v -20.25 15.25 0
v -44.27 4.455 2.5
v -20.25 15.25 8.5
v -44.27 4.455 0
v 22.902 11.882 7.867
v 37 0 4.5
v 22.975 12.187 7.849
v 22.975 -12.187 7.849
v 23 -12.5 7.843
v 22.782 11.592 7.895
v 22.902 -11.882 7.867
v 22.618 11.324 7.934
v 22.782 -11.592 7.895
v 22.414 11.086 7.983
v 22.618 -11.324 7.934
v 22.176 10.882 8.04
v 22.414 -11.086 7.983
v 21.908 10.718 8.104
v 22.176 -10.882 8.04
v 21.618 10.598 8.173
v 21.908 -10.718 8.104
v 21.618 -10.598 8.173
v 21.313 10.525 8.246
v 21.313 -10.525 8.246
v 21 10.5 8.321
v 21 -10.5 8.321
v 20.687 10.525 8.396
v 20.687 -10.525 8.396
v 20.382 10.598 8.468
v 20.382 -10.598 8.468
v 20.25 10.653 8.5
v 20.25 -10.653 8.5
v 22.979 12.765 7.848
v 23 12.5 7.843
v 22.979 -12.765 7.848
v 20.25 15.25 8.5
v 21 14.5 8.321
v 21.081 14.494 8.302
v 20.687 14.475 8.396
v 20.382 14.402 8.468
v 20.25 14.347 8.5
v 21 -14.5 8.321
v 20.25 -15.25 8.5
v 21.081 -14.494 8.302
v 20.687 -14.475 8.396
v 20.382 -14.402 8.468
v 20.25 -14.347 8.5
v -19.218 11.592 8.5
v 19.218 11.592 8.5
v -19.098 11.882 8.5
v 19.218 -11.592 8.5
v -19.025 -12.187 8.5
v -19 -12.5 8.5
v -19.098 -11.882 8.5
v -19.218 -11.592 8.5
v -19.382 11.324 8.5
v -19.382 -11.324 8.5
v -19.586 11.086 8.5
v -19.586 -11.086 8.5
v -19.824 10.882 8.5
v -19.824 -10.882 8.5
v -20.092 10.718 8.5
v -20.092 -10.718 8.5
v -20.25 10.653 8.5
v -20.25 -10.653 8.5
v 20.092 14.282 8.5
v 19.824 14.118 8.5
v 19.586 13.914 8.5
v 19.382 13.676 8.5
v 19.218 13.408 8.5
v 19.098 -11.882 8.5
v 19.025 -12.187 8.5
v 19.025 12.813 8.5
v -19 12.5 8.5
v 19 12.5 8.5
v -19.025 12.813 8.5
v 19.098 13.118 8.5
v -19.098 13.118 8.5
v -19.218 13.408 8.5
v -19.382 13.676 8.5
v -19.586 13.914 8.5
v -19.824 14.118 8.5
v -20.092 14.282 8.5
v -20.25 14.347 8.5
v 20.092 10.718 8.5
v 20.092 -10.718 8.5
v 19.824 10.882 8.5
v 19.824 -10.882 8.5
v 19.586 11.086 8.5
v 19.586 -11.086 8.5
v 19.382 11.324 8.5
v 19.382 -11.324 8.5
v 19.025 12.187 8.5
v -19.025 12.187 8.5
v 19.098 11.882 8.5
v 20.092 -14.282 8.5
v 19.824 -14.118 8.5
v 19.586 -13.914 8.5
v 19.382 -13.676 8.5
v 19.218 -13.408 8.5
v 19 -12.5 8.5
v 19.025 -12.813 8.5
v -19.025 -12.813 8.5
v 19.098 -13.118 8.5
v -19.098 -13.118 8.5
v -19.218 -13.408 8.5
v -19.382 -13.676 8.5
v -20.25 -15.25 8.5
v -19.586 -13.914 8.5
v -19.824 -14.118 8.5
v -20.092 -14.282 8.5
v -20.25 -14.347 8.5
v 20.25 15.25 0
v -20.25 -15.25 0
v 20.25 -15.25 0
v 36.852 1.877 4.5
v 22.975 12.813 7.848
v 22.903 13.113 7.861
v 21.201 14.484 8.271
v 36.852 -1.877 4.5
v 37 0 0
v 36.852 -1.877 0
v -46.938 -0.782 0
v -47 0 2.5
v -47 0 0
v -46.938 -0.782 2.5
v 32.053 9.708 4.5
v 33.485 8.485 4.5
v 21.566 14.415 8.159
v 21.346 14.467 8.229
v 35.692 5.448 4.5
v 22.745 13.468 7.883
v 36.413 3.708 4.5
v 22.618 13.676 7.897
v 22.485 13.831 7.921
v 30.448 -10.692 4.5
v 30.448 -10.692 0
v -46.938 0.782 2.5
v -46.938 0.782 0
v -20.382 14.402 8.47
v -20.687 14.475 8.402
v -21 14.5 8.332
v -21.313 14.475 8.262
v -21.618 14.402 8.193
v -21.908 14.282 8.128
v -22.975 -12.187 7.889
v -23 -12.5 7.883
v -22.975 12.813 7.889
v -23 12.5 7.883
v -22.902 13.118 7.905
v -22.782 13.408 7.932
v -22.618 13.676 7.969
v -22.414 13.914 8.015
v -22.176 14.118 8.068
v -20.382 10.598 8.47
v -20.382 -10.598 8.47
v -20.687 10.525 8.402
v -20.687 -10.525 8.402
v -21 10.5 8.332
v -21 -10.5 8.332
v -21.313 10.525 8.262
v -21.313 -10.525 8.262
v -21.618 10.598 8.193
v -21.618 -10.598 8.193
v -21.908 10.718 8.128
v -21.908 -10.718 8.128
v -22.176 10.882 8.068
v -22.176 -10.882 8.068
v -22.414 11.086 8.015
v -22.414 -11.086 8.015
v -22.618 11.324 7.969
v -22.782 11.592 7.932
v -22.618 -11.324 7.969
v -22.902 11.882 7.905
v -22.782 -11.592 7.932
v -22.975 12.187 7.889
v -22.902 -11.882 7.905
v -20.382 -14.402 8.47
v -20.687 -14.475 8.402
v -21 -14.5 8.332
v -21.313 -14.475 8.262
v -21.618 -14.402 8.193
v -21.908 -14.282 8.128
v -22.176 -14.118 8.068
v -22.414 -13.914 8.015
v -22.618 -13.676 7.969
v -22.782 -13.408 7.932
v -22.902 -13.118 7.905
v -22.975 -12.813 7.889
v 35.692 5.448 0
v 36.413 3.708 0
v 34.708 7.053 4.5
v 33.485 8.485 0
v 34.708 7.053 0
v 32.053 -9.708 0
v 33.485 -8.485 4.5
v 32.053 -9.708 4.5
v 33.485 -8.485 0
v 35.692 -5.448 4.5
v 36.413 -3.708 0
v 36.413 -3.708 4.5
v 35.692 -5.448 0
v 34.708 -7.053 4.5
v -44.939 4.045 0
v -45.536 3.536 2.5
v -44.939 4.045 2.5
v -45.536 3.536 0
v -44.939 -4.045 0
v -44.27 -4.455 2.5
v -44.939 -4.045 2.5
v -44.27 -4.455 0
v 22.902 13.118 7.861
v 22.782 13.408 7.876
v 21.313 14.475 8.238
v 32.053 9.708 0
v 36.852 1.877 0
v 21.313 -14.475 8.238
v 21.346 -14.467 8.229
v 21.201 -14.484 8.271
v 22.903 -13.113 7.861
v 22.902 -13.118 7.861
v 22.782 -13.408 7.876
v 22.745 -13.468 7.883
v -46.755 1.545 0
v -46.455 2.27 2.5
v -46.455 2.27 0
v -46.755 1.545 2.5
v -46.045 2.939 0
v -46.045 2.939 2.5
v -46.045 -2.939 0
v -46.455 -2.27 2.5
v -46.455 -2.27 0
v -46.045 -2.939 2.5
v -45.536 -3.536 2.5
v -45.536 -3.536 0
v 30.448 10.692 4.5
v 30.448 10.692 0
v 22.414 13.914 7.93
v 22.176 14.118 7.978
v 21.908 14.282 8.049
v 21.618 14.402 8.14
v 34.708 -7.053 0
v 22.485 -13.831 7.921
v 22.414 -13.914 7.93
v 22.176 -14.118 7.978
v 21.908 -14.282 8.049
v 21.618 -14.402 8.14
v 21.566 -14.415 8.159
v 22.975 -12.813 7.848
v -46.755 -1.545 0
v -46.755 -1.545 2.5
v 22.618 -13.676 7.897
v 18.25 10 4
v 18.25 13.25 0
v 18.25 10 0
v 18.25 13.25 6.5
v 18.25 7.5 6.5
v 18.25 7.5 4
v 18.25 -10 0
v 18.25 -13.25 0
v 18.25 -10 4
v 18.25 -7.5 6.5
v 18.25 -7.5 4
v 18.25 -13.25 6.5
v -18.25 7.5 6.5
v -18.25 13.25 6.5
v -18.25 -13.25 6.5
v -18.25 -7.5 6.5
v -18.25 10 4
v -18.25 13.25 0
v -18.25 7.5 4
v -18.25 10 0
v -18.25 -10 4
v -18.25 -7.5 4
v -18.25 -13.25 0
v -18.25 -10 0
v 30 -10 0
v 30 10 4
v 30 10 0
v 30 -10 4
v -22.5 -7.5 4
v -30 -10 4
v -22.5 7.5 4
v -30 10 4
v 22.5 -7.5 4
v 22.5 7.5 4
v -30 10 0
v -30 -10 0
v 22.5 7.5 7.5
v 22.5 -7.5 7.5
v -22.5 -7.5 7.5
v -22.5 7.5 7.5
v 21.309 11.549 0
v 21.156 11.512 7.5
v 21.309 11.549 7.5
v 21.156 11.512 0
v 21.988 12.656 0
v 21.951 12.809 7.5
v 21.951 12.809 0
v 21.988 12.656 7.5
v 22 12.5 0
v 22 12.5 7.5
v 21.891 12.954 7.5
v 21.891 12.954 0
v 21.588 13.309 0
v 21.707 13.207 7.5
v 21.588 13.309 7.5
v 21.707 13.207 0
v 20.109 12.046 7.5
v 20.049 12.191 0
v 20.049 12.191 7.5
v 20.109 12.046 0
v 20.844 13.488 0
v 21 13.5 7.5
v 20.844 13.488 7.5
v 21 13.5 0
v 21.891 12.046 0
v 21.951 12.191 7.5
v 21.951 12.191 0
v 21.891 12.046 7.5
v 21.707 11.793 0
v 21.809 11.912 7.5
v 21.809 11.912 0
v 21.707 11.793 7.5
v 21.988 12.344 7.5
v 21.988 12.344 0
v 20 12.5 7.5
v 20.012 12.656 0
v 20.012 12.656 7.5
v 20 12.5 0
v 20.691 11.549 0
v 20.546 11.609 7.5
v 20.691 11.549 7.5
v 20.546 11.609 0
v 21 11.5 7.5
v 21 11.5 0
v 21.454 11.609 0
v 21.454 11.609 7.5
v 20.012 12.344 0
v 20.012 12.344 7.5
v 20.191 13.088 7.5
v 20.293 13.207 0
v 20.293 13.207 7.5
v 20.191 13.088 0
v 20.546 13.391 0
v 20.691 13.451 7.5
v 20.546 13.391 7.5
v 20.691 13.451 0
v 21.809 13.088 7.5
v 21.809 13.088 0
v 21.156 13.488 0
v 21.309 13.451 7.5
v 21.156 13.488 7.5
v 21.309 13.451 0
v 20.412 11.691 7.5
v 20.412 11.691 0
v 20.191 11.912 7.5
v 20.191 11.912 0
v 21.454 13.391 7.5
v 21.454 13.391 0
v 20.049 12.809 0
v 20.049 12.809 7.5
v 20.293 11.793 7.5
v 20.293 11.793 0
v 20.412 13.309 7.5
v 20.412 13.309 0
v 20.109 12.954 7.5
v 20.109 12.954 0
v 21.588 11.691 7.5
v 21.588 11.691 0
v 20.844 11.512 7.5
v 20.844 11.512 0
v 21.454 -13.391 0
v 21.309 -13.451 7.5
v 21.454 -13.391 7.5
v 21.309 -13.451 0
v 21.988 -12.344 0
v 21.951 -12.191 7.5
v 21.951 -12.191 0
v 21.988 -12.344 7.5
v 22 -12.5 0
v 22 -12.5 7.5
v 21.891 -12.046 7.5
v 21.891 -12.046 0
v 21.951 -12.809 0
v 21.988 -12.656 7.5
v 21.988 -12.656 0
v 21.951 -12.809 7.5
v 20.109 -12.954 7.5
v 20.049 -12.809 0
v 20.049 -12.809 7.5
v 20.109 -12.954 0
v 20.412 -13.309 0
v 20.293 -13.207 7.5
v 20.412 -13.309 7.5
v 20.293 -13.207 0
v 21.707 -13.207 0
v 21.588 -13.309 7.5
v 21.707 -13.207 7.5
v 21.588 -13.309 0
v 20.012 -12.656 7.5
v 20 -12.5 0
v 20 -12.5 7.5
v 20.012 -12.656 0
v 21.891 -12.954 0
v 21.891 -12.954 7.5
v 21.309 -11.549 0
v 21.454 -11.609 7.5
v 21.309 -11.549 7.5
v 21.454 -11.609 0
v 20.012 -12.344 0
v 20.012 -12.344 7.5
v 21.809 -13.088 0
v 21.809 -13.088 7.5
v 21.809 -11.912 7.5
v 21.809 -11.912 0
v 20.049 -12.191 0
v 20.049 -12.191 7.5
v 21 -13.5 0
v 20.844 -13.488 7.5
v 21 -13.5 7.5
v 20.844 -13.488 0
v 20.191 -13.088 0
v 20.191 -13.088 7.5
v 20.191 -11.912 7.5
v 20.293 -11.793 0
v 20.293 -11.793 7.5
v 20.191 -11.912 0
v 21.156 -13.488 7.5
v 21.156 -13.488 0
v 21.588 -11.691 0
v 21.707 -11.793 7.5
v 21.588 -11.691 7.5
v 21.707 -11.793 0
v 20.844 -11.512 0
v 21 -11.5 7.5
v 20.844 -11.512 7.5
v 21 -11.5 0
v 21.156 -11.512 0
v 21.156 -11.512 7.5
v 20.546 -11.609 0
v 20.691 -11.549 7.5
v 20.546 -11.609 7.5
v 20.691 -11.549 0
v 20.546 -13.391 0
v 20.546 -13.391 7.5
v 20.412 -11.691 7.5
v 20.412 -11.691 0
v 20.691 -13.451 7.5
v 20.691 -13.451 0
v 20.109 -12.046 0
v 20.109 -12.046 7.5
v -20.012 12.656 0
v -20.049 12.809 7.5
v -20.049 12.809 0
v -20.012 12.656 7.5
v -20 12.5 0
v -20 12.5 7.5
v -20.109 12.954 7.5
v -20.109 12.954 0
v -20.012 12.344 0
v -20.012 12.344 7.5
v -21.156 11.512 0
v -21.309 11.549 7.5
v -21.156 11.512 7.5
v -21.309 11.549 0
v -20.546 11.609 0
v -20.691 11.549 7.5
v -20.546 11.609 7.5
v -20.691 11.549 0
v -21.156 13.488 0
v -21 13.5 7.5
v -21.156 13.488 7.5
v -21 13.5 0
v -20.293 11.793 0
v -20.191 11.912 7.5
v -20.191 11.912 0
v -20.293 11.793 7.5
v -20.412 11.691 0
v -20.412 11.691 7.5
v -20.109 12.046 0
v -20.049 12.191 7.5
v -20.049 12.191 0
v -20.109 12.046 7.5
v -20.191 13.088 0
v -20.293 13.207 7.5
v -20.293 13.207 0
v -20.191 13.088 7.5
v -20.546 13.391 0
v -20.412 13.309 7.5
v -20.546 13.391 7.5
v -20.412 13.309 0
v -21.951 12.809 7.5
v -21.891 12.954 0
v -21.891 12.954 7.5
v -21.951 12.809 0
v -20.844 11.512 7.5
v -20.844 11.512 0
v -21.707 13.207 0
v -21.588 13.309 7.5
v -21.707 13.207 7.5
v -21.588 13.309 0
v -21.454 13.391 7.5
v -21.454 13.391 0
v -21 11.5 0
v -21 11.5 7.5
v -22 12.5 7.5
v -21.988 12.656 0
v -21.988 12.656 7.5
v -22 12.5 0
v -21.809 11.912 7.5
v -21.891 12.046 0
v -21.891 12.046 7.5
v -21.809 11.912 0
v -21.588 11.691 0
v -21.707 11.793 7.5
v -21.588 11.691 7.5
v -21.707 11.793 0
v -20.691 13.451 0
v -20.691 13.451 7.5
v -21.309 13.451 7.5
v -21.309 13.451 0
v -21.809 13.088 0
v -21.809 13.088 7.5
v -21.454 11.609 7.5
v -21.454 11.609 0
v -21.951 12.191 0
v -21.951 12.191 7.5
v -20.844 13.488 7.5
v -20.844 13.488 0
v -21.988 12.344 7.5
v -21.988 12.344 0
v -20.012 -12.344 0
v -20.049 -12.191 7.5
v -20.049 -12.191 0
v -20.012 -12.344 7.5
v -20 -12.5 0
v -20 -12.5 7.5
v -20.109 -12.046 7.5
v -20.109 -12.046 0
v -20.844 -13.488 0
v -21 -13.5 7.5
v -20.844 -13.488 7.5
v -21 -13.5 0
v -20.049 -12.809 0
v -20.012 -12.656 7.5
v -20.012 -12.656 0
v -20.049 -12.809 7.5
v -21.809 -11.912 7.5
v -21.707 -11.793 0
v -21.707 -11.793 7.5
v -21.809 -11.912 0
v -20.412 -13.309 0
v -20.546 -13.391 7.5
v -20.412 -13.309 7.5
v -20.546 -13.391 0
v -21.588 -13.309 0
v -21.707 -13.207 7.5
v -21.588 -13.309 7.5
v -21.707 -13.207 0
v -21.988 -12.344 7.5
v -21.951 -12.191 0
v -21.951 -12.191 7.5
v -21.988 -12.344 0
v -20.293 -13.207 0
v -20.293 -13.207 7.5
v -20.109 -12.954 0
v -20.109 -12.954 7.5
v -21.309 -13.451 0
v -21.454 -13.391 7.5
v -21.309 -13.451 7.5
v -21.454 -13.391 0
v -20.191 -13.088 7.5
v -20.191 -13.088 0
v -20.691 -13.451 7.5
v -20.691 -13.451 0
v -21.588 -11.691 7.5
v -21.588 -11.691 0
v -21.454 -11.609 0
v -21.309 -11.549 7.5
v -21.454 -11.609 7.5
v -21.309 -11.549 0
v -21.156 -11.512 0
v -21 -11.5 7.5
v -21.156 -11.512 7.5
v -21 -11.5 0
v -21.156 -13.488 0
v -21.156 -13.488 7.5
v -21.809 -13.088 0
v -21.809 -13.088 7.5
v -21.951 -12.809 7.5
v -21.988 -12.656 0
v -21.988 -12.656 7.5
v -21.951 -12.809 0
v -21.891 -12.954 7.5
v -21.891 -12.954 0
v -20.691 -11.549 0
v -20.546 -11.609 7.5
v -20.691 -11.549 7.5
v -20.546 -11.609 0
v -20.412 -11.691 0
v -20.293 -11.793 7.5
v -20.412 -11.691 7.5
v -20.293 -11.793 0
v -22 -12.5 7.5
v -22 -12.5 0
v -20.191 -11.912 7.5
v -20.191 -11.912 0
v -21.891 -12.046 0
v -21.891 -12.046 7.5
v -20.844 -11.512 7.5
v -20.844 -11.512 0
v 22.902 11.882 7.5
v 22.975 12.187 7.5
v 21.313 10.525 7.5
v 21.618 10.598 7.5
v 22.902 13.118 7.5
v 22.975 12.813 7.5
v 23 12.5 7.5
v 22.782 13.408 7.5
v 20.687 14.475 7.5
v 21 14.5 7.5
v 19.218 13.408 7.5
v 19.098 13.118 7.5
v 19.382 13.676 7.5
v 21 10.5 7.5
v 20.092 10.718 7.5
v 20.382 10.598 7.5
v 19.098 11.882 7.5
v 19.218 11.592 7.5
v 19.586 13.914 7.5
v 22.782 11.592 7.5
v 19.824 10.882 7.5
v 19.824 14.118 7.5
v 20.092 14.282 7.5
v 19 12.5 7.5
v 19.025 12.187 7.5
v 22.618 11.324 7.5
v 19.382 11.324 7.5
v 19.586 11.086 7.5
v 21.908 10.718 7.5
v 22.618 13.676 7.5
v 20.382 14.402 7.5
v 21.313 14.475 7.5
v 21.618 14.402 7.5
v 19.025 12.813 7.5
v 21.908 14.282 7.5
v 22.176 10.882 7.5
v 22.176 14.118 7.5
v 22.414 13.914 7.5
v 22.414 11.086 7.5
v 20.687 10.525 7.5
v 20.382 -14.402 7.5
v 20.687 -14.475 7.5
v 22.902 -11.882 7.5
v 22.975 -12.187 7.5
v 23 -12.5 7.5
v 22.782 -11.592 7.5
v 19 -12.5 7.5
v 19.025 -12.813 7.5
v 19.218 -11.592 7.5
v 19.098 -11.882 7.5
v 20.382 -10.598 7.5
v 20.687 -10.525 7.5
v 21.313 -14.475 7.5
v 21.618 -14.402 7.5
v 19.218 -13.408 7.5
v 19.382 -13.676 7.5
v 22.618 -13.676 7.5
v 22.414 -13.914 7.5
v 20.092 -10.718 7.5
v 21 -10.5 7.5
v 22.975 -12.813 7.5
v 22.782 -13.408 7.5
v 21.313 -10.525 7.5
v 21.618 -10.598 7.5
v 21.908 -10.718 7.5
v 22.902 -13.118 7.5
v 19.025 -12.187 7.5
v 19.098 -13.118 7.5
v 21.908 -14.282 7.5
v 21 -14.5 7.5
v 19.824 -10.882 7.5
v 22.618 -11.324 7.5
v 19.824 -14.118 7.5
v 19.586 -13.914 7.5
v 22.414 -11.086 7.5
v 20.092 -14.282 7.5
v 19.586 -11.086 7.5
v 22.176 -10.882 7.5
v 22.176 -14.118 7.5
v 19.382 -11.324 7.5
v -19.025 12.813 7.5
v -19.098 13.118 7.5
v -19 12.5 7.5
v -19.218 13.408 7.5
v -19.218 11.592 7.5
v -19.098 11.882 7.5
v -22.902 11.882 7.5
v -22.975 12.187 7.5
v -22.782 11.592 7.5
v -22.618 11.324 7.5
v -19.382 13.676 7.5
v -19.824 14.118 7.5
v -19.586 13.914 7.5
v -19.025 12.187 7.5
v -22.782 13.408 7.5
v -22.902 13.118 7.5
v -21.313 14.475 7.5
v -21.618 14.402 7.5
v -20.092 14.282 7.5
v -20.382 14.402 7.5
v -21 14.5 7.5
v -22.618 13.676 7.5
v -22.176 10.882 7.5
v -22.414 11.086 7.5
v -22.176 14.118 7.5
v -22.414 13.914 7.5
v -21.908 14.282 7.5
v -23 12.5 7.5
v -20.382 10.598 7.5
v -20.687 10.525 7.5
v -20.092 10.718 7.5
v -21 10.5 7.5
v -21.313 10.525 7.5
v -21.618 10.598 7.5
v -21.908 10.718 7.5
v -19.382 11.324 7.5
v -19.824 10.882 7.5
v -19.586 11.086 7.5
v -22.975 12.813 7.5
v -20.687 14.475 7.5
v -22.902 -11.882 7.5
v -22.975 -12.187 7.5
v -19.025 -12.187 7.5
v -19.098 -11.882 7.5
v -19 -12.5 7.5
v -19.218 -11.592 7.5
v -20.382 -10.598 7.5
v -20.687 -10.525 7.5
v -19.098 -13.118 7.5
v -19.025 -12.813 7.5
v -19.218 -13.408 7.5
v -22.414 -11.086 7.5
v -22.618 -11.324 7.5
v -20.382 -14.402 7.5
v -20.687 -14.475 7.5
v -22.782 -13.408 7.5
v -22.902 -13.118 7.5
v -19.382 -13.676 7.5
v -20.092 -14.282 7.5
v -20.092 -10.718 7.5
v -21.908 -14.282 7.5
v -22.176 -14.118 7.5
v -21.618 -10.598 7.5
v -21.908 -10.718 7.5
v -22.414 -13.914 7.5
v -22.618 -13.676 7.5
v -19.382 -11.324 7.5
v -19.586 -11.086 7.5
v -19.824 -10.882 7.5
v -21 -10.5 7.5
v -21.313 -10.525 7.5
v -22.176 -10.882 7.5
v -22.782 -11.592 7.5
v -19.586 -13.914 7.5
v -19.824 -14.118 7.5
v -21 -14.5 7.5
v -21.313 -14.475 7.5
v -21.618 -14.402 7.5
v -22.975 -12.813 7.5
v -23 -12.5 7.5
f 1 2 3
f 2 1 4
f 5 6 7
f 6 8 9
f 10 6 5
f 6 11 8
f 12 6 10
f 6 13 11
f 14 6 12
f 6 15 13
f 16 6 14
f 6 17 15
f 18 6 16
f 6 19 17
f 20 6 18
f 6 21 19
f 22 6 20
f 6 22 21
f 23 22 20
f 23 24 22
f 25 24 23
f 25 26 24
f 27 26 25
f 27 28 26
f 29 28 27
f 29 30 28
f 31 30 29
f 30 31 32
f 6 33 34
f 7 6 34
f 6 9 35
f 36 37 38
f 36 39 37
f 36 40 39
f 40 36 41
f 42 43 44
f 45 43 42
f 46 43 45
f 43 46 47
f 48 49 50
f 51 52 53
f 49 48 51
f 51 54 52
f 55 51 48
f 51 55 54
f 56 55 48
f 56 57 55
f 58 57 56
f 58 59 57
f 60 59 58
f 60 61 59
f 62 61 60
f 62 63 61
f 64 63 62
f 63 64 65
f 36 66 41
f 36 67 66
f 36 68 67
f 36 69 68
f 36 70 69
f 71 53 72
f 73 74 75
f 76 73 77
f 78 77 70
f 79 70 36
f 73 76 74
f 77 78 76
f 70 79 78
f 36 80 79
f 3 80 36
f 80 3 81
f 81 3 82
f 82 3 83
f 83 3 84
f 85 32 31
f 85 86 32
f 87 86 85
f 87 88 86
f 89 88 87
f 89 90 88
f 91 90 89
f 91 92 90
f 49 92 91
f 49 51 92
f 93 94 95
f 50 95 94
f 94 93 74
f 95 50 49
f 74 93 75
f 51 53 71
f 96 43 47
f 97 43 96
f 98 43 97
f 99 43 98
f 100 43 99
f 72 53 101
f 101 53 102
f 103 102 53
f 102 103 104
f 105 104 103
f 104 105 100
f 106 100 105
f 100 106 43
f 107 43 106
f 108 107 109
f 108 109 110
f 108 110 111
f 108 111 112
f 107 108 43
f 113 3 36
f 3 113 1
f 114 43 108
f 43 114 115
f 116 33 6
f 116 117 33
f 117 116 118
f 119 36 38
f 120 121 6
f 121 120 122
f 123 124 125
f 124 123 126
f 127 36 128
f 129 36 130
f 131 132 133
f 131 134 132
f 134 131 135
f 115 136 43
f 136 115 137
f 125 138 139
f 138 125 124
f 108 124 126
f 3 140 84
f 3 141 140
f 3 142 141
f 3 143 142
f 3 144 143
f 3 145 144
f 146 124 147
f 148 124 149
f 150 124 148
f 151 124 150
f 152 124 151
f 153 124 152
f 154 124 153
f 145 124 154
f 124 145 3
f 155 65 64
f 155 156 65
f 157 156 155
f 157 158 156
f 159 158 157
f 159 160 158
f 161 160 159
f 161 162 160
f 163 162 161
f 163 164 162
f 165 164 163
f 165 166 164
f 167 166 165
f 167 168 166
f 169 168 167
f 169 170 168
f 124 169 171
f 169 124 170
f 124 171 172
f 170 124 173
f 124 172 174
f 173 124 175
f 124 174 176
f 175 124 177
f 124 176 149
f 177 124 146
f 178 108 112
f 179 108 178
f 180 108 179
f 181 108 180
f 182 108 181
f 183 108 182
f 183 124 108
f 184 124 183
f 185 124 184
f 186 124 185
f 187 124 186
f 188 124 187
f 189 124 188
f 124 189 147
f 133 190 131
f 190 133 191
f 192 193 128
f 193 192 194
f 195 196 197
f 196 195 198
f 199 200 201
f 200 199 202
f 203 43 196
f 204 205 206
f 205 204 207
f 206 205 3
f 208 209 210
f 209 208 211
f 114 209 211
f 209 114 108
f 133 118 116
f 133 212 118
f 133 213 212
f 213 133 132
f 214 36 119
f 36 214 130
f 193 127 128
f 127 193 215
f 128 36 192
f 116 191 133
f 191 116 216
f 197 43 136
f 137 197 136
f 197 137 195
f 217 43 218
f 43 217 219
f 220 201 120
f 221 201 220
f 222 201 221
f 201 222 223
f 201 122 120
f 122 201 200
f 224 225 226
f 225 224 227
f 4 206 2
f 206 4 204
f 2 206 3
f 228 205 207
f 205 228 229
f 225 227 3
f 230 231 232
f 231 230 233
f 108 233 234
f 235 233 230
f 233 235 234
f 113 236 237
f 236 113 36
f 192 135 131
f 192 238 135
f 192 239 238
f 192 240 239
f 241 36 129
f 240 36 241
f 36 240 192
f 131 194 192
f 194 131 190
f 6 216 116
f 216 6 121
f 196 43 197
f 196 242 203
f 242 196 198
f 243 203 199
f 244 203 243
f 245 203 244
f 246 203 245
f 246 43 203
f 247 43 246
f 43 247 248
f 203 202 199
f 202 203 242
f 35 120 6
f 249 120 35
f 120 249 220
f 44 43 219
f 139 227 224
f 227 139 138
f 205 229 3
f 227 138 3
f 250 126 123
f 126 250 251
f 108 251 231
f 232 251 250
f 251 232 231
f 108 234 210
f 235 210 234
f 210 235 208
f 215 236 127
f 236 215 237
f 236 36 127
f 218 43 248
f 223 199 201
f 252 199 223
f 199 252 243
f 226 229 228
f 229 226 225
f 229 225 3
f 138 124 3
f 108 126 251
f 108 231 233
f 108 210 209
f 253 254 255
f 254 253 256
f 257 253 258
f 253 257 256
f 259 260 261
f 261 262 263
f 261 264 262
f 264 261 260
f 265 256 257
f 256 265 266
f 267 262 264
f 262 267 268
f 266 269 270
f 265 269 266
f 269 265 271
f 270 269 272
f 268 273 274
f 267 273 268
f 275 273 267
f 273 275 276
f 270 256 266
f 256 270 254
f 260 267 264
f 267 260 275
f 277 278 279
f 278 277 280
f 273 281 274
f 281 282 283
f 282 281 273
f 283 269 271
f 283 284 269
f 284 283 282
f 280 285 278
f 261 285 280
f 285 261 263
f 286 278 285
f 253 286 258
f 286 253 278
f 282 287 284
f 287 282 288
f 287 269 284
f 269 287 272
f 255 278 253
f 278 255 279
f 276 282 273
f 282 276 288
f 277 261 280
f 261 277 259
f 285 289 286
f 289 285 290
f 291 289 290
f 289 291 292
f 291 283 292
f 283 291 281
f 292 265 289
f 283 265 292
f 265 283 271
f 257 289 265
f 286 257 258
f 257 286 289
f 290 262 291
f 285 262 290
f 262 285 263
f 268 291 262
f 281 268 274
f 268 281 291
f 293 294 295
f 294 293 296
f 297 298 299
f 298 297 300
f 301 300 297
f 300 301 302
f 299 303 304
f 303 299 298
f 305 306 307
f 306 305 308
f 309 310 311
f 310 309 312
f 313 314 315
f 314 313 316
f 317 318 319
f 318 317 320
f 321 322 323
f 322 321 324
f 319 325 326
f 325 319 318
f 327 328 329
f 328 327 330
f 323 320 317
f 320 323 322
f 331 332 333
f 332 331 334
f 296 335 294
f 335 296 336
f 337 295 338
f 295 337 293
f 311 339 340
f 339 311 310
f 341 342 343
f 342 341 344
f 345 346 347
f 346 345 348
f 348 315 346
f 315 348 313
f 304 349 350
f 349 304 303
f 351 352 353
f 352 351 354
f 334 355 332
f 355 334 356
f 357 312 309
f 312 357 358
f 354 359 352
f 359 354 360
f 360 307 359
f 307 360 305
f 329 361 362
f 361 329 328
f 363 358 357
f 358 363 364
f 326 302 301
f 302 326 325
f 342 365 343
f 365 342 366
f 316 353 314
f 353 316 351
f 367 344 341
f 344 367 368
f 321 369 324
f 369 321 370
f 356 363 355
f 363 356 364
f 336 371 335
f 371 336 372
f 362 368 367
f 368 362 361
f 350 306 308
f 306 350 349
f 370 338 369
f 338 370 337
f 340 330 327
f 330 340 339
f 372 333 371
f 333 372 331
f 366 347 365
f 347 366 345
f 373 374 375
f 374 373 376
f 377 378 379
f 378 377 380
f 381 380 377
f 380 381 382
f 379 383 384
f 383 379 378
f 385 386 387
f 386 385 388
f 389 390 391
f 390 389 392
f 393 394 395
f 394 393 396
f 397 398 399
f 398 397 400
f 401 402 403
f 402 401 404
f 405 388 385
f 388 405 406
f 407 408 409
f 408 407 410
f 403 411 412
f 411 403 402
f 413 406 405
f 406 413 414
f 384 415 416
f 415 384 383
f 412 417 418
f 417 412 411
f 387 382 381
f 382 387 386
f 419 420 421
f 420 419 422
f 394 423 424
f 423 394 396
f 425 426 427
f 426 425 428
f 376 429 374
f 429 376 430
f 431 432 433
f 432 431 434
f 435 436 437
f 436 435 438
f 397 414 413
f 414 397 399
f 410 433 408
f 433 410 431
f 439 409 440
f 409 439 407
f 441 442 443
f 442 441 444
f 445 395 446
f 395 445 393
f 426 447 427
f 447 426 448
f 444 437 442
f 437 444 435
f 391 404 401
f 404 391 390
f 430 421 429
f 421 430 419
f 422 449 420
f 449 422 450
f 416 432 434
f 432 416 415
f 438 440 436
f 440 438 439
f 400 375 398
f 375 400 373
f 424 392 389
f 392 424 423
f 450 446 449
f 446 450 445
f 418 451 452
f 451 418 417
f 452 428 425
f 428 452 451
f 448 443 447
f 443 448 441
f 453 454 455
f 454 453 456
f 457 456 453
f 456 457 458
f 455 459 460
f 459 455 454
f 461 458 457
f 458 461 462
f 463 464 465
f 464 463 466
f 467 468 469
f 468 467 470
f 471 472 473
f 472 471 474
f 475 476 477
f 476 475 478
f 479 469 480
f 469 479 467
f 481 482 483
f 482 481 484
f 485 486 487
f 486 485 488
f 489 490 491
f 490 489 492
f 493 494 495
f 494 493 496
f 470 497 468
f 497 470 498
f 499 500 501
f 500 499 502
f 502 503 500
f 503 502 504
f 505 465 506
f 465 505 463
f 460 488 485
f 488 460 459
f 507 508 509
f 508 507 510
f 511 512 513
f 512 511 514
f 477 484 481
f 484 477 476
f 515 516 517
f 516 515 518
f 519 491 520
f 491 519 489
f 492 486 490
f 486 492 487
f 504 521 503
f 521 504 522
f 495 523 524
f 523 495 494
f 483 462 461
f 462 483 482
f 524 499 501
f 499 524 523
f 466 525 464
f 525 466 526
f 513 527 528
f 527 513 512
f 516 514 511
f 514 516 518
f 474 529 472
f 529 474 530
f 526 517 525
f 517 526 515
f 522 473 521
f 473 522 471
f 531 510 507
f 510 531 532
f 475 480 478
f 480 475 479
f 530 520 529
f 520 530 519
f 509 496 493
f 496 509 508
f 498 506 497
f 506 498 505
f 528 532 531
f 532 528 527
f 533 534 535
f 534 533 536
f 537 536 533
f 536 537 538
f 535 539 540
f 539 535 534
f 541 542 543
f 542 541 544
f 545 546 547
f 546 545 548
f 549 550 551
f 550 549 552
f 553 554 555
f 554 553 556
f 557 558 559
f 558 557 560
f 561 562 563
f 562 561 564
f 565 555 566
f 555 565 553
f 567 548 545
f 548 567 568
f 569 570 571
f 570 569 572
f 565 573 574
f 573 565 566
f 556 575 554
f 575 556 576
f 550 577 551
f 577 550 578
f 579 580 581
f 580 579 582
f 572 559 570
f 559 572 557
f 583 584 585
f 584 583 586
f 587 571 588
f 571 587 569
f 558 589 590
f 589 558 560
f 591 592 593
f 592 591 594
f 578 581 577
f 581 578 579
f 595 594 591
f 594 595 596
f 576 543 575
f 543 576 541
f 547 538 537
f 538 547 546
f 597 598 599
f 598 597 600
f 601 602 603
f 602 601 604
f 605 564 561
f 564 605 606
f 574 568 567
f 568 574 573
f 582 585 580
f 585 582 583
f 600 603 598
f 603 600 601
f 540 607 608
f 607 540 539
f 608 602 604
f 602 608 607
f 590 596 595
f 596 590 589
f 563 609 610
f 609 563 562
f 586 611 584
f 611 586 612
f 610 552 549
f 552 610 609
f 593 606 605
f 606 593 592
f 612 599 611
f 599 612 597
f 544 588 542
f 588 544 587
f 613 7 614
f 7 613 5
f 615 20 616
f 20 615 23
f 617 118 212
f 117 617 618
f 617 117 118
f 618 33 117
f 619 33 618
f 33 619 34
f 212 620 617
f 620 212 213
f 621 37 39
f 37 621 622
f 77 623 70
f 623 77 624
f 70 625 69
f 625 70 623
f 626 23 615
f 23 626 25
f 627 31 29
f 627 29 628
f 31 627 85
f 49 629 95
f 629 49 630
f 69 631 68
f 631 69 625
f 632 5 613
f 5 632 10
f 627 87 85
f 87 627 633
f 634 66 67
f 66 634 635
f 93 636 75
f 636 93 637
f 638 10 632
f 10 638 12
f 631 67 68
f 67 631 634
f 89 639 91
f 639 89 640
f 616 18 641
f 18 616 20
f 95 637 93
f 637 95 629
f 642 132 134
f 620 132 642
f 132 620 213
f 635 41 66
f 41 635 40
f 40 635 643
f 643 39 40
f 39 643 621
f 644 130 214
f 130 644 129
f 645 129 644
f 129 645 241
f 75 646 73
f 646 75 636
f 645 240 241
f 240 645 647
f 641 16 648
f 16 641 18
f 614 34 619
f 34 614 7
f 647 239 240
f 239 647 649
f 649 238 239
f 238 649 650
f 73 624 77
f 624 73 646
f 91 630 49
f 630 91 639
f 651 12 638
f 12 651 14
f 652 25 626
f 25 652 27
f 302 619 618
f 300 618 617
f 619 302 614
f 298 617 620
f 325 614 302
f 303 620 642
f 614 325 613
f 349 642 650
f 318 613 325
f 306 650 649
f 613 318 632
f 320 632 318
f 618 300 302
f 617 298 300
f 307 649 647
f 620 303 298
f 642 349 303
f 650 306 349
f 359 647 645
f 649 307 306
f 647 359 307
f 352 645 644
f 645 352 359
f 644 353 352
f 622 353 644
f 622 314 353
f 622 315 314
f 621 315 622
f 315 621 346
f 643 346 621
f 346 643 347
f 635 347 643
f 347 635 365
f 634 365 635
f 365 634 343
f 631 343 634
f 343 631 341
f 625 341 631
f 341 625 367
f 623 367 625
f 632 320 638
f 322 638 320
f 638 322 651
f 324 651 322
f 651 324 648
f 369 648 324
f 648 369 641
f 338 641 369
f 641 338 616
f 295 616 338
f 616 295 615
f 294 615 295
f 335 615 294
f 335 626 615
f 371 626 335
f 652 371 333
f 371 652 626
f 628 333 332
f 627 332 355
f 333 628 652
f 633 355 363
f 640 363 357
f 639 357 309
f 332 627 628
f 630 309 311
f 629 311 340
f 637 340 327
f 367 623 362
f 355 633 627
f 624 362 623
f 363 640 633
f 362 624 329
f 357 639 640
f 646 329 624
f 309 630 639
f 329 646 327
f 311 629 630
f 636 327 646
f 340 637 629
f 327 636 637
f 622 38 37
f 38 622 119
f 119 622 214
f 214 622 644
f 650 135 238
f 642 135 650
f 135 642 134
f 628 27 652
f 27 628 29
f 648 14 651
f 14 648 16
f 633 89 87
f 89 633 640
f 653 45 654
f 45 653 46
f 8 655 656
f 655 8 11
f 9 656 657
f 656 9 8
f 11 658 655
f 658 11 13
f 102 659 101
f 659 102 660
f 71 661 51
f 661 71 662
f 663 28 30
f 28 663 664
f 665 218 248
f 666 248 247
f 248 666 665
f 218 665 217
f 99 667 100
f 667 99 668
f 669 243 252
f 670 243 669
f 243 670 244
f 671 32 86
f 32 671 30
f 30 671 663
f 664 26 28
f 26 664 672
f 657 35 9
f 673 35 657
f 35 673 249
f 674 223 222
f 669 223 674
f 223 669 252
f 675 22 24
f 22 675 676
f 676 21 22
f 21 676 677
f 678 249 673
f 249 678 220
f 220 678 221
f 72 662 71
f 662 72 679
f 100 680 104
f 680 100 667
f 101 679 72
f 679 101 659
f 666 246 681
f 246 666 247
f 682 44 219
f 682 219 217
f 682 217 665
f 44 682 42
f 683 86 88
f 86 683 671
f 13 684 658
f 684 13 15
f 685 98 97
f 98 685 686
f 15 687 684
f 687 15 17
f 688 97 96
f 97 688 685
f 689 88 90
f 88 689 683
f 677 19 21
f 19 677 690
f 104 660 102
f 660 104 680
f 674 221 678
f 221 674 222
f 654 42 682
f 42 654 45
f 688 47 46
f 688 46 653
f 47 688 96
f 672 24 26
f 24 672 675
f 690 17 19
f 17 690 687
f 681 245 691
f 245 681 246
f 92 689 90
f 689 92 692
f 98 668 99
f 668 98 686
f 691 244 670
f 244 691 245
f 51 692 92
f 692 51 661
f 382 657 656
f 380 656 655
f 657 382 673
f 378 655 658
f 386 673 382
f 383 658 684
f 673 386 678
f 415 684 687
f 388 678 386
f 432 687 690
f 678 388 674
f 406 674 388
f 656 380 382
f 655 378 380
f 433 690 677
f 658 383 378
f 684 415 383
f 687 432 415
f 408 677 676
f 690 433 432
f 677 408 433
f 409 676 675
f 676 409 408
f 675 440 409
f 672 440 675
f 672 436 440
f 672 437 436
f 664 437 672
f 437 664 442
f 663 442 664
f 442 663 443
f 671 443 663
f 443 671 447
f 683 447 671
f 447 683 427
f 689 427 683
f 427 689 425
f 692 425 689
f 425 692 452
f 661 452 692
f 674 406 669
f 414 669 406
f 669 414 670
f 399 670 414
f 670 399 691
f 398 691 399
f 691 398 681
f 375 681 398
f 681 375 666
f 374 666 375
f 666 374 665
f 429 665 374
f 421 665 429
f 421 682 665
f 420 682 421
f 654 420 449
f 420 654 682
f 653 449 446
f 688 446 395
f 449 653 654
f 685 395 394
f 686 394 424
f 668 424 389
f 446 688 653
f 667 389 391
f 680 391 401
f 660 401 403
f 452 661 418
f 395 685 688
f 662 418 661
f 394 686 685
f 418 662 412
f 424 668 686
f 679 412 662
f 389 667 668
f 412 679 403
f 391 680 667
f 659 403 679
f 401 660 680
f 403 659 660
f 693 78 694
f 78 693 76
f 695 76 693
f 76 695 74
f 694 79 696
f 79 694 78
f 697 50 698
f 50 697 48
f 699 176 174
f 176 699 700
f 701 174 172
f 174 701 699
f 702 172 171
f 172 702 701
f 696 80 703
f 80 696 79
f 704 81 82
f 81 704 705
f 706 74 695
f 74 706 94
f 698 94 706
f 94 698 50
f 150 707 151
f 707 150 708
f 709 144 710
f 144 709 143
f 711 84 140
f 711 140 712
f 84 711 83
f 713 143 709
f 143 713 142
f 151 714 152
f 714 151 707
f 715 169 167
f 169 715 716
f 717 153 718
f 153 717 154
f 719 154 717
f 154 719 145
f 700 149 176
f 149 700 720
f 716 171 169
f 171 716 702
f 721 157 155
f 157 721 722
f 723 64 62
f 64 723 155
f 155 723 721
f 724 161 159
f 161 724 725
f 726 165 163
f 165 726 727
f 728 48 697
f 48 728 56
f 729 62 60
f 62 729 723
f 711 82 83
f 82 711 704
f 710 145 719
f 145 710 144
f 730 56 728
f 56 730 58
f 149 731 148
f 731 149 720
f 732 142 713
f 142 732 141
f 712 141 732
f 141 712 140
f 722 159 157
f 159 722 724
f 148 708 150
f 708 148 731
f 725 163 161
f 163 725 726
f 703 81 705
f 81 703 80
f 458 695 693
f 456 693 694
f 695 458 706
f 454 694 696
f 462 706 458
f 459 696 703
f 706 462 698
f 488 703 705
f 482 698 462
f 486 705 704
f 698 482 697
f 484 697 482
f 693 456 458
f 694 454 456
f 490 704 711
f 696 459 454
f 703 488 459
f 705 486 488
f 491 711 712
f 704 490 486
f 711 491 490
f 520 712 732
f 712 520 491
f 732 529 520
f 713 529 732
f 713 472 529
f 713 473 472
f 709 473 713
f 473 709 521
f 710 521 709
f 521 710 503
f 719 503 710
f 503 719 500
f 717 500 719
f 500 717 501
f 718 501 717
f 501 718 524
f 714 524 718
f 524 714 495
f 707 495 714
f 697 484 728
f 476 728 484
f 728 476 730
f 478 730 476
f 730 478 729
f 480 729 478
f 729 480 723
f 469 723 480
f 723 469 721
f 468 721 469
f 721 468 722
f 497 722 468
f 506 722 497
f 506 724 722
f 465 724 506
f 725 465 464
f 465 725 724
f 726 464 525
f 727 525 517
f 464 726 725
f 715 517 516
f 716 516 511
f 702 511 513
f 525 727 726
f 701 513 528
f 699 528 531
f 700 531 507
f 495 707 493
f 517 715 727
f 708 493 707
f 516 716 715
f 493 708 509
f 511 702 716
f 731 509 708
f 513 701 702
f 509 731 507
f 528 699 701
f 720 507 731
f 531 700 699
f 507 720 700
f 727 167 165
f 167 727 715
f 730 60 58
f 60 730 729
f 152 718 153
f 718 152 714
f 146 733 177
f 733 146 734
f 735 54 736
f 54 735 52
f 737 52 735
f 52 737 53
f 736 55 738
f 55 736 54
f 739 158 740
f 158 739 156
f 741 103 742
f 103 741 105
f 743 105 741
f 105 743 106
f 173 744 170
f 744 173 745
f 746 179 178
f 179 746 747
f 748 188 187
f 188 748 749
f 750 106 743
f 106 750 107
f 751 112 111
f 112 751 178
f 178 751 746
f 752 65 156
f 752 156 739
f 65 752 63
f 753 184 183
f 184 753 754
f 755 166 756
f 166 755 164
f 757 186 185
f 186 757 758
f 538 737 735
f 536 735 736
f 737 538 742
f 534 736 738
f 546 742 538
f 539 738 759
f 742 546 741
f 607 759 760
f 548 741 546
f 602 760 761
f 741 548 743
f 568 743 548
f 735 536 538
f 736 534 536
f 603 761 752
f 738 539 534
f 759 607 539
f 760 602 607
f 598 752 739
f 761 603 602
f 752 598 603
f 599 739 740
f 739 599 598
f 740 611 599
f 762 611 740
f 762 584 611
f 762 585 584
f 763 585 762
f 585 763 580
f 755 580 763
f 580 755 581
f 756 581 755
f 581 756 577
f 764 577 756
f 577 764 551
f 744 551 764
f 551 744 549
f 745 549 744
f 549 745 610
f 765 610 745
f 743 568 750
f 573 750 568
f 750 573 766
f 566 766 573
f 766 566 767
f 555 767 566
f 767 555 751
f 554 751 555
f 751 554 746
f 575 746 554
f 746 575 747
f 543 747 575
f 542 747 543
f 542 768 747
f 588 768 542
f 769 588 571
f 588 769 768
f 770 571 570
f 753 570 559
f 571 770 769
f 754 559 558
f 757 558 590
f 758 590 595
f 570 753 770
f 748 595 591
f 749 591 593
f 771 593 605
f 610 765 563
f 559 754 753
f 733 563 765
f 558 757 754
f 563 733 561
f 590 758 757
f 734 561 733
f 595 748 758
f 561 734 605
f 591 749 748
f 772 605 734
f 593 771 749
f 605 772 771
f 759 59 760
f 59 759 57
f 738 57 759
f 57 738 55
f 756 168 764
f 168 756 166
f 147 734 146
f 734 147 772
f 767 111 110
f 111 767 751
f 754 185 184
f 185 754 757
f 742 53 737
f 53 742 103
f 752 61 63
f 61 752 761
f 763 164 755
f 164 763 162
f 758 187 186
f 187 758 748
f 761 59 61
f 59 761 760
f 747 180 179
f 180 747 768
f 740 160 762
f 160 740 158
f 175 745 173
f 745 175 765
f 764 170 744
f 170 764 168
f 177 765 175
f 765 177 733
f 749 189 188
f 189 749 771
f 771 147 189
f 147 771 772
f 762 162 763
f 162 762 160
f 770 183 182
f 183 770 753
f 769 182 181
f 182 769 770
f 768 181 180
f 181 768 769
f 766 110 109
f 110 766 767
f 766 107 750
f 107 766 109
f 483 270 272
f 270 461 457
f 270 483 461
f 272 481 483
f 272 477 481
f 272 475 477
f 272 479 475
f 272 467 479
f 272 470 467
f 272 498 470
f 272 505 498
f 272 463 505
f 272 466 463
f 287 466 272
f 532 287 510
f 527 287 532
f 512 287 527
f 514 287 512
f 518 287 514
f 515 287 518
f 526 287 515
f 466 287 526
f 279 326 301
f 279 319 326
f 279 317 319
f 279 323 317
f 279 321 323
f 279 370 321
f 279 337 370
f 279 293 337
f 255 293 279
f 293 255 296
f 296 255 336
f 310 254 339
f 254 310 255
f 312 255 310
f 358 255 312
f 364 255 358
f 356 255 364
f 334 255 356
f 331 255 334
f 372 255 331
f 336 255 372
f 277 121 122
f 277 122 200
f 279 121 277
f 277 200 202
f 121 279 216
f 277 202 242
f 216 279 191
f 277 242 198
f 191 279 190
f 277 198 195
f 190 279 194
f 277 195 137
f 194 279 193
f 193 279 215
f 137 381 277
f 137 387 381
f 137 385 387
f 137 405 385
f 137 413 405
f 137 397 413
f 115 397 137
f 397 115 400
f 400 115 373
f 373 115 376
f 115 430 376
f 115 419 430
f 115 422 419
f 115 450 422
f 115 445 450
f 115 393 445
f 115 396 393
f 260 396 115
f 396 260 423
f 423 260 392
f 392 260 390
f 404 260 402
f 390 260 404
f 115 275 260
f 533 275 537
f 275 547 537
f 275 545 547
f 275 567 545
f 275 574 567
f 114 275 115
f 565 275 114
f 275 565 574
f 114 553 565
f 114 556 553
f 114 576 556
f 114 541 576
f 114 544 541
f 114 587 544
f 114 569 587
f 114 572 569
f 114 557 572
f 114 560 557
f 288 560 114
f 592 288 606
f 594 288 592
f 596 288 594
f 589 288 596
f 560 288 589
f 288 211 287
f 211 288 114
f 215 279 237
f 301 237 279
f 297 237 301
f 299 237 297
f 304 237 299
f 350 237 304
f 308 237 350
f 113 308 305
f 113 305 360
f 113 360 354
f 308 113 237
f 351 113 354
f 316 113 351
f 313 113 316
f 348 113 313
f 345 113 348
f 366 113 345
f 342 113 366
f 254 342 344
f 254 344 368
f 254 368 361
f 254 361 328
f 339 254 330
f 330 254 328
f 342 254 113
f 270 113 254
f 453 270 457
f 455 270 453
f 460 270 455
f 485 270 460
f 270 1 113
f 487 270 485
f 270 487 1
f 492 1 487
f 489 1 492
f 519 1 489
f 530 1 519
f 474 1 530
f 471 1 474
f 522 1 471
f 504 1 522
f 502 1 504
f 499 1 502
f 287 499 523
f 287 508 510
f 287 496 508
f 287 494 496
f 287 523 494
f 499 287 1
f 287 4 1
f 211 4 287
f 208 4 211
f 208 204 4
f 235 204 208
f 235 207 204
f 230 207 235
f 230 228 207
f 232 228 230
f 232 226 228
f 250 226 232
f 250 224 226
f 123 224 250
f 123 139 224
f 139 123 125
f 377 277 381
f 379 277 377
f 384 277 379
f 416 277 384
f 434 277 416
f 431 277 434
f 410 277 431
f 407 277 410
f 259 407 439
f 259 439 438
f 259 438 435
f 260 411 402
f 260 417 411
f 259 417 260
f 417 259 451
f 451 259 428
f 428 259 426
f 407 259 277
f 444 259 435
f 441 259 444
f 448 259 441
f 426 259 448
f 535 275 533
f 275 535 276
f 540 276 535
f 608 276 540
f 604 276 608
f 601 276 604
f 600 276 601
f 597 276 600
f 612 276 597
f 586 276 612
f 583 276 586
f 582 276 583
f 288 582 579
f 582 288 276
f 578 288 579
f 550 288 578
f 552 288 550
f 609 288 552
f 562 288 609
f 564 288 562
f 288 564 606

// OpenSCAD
l = 36.5;
w = 26.5;
h = 13;

wall = 4.0;

w2 = 25;
w3 = -42;
bottom = 0;


difference(){
  union(){
  hull(){
    translate([0,0,0])cube([l+wall,w+wall,h+wall], center=true);
    translate([w2,0,-(h-wall)/2])cylinder(r=12,h=(h-wall),$fn=40); 
    translate([w3,0,-(5)/2])cylinder(r=5,h=(5),$fn=40); 
  }  
  if (bottom==1){
    hull(){
    translate([0,0,h/2+5])cube([10,10,2],center=true); 
    translate([0,0,h/2])cube([20,20,2],center=true); 
    }
  }
  }
  
  
  translate([0,0,0])cube([l,w,h ], center=true);
  translate([0,0,0])cube([60,20,8 ], center=true);

  translate([0,0,0])cube([45,15,h+2 ], center=true);
  
  translate([21,+12.5,-50/2])cylinder(r=1,h=50,$fn=40); 
  translate([21,-12.5,-50/2])cylinder(r=1,h=50,$fn=40); 
  translate([-21,+12.5,-50/2])cylinder(r=1,h=50,$fn=40); 
  translate([-21,-12.5,-50/2])cylinder(r=1,h=50,$fn=40);   
  
  translate([21,+12.5,h/2+wall/2-1])cylinder(r=2,h=50,$fn=40);
  translate([21,-12.5,h/2+wall/2-1])cylinder(r=2,h=50,$fn=40); 
  translate([-21,+12.5,h/2+wall/2-1])cylinder(r=2,h=50,$fn=40); 
  translate([-21,-12.5,h/2+wall/2-1])cylinder(r=2,h=50,$fn=40); 
  
  translate([0,0,-50])color("red")cube([200,200,100], center=true);
  if (bottom==1){
    translate([0,0,h/2])cube([8.05,8.05,80],center=true);   
  }
}
